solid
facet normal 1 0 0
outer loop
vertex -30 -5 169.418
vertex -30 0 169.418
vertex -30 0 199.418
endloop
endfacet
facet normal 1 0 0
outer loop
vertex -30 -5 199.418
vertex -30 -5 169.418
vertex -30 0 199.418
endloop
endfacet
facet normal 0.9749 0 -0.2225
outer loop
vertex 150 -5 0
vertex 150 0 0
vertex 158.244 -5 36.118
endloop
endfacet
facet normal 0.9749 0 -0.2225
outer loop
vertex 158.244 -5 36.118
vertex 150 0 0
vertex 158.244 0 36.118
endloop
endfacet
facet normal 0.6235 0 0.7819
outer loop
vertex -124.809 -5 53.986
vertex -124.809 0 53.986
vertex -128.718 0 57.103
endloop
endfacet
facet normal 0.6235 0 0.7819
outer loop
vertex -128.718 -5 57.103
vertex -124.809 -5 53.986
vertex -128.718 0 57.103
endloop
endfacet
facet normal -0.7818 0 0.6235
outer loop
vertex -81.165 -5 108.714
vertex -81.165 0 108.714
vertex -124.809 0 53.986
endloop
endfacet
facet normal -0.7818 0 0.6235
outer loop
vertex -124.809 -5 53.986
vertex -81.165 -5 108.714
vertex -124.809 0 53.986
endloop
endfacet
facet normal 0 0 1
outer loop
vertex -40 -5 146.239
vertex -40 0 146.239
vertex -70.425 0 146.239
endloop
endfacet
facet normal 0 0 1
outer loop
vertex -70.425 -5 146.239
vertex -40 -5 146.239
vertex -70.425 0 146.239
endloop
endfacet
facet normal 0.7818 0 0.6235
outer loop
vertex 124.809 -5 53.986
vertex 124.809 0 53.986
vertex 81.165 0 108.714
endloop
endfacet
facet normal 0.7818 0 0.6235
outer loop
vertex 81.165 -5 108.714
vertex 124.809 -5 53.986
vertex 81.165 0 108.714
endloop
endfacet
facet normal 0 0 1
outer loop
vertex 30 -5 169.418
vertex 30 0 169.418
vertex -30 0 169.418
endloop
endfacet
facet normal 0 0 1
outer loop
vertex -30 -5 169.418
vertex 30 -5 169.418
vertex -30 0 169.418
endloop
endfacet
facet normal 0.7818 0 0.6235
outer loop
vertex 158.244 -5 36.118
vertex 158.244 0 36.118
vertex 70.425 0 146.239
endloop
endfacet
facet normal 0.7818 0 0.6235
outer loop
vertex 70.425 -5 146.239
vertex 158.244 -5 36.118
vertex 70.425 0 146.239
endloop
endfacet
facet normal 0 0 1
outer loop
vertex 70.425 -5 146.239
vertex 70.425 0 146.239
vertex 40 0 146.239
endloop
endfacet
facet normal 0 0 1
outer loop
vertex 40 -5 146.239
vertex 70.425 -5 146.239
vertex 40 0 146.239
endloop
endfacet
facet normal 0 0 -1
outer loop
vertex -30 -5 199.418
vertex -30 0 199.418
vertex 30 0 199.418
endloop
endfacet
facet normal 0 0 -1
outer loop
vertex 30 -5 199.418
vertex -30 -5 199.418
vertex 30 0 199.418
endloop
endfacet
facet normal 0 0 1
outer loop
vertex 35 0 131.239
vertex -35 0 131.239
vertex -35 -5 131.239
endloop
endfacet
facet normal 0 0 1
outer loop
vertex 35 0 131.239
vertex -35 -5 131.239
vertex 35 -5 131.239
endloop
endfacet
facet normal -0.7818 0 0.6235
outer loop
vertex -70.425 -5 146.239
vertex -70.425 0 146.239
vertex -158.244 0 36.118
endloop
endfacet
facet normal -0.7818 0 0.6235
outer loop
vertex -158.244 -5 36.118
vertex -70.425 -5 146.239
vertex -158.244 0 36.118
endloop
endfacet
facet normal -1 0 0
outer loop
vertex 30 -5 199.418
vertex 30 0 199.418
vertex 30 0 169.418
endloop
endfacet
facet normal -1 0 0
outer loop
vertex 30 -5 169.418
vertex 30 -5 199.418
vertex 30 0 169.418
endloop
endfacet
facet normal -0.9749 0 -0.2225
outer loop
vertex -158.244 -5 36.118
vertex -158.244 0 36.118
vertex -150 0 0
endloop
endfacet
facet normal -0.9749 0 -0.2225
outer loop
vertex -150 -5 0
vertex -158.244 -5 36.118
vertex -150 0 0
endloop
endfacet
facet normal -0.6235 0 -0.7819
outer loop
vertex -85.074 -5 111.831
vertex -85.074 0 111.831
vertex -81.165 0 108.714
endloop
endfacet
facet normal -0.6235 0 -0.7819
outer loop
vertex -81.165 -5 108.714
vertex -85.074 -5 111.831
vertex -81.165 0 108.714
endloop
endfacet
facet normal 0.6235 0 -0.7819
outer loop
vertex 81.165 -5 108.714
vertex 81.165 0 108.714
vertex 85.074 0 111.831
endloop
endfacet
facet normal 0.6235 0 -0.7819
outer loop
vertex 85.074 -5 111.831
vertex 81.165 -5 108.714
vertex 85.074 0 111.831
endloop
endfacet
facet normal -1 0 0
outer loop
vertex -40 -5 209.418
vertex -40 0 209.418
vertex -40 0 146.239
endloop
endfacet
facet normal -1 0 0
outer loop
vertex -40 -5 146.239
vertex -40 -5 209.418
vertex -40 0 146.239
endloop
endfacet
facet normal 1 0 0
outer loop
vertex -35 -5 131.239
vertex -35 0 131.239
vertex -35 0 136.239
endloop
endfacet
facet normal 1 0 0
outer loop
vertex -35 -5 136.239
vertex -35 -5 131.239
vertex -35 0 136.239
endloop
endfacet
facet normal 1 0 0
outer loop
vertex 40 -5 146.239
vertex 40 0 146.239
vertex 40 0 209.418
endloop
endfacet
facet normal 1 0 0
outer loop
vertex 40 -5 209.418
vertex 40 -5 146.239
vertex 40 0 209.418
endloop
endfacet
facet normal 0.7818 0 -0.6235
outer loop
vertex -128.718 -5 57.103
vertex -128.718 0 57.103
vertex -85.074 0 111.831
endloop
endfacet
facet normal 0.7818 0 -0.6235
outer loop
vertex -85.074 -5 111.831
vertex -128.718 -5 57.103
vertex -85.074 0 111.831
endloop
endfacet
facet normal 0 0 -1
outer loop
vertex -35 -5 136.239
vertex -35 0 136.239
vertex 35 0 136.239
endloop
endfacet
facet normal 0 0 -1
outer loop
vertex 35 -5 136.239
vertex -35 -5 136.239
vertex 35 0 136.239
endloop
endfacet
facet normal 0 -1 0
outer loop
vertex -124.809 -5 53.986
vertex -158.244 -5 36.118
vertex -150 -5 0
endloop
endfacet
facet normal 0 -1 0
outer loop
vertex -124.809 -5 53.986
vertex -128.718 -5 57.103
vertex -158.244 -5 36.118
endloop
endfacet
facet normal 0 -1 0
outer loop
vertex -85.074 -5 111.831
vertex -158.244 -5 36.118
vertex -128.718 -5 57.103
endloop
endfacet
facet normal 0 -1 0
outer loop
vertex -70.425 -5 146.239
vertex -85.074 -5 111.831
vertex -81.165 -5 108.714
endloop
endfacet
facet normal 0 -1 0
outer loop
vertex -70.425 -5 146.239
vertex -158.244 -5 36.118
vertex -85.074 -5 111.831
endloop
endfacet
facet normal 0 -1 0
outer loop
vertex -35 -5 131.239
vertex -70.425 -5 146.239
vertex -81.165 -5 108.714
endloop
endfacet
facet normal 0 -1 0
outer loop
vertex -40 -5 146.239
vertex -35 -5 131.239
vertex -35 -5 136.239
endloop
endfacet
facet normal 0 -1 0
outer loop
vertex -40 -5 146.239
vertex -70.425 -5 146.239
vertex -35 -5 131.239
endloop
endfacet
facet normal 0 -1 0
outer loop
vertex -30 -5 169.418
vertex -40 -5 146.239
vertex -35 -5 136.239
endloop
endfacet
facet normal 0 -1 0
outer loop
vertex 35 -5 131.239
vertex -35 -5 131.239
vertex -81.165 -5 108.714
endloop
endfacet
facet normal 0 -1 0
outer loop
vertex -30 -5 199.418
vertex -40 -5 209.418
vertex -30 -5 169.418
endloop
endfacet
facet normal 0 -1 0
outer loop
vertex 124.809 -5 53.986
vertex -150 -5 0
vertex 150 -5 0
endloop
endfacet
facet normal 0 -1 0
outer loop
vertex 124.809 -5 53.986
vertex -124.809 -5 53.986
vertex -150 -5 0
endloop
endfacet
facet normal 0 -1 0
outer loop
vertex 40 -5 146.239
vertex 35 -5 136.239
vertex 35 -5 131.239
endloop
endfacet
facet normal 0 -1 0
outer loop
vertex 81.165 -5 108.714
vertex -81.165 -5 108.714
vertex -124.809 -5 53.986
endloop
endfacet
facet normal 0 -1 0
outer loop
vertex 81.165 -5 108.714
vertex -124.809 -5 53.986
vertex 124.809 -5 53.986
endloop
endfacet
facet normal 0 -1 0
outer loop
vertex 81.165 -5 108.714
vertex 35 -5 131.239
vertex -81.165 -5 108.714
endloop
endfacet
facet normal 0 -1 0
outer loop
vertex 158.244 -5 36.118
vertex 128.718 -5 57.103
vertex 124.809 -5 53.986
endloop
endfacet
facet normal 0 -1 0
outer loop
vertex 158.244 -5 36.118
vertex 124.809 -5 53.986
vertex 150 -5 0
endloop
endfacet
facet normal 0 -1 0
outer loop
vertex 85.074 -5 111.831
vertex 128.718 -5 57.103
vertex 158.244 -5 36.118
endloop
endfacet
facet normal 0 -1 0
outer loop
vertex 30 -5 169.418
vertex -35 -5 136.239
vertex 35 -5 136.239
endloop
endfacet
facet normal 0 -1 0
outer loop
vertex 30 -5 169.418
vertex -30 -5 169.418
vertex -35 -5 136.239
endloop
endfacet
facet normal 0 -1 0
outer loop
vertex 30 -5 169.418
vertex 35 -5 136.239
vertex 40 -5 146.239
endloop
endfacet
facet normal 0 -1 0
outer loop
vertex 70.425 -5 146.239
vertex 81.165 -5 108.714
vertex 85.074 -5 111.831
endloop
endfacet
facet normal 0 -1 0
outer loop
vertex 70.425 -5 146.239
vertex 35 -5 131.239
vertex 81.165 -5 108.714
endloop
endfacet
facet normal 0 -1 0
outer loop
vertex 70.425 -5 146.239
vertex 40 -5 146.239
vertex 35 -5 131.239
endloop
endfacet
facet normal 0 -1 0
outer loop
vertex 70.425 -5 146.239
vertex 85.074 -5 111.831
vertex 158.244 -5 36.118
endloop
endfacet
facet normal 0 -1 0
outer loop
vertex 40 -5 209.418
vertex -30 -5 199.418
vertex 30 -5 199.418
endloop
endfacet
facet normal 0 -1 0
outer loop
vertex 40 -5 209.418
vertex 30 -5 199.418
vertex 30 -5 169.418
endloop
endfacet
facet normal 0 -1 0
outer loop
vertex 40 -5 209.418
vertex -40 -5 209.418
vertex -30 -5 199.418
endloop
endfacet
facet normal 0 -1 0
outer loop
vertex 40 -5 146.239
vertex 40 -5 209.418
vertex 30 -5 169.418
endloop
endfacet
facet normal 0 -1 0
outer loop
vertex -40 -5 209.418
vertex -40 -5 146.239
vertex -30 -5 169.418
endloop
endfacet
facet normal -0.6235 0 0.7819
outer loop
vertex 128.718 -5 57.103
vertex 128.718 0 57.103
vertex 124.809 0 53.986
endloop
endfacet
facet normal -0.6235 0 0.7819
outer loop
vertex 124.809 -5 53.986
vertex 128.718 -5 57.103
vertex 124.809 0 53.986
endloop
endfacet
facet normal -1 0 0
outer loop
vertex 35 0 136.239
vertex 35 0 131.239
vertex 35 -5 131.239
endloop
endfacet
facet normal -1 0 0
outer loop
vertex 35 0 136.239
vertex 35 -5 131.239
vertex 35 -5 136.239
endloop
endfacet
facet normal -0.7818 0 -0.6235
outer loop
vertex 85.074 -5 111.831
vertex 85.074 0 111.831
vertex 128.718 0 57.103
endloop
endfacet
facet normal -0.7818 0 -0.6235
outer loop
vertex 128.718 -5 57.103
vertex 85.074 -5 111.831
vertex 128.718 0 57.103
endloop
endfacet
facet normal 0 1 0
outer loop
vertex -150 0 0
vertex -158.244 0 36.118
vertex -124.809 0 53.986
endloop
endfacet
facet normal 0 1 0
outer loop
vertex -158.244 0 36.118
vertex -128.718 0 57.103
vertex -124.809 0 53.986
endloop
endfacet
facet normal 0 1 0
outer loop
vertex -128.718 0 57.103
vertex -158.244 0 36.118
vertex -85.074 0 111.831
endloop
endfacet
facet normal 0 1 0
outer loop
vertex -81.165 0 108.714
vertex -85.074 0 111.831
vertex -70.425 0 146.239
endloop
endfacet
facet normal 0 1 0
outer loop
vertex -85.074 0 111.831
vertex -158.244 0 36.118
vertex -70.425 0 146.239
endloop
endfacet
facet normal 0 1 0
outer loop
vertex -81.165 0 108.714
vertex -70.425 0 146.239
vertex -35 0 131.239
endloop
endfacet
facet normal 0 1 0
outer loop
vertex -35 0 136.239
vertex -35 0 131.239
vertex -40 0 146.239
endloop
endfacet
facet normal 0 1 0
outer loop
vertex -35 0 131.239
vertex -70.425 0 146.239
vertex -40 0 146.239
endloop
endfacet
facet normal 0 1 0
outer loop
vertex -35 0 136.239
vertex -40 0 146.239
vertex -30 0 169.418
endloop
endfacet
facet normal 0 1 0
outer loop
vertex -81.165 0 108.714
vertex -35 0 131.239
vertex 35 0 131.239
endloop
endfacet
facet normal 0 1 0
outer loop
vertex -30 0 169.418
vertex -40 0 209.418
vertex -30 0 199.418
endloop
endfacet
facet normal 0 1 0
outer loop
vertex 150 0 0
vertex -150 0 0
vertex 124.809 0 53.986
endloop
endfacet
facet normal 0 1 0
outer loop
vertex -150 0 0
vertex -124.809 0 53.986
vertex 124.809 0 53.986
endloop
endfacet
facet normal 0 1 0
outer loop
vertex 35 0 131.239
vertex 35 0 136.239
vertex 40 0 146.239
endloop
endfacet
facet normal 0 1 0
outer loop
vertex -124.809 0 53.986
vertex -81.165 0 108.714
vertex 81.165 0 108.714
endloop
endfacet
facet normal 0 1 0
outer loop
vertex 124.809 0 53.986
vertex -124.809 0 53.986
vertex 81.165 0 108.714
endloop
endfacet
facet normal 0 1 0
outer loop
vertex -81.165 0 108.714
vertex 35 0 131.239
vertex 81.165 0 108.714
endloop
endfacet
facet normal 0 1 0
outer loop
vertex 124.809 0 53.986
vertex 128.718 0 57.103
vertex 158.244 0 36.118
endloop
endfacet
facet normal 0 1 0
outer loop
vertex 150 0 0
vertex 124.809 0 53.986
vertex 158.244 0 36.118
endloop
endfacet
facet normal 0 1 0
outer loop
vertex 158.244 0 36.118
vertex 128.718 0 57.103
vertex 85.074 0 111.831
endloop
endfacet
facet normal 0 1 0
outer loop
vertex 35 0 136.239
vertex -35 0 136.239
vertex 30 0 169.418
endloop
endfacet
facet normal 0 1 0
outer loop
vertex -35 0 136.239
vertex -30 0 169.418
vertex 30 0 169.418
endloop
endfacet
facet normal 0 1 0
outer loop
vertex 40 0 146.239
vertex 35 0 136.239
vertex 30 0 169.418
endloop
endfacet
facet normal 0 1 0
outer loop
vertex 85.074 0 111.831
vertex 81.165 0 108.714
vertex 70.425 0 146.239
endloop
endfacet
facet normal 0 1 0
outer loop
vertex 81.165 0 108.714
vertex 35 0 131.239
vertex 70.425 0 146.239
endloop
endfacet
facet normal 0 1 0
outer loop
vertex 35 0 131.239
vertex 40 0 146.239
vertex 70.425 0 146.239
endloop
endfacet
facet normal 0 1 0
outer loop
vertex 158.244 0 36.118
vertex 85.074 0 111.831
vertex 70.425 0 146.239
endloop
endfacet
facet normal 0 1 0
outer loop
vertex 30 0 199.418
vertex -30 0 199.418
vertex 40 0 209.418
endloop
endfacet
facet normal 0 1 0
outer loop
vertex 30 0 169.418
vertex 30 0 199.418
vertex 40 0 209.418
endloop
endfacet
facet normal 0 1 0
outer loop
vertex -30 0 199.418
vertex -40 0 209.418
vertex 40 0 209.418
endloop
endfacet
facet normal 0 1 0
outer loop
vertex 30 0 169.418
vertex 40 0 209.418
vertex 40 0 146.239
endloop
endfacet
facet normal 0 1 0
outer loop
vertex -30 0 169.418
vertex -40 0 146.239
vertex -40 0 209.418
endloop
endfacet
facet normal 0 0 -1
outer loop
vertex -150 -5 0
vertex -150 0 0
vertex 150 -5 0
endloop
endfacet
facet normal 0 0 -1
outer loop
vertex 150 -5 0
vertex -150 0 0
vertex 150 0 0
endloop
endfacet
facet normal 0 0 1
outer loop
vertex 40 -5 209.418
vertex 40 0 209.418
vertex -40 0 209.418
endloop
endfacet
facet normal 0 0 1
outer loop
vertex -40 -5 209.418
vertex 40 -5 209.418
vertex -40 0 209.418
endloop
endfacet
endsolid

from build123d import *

# Parameters (mm, degrees)
F0_W     = 70
F0_H     = 5
F1_DEPTH = 5


with BuildPart() as f1:
    # F0 (on Front) → F1 (new body)
    with BuildSketch(Plane.XZ):
        Polygon((-40, 146.239187), (-70.425081, 146.239187), (-158.24372, 36.118096), (-150, 0), (150, 0), (158.24372, 36.118096), (70.425081, 146.239187), (40, 146.239187), (40, 209.417821), (1.491508, 209.417821), (-40, 209.417821), align=None)
        Polygon((-81.164699, 108.714), (-124.808985, 53.985796), (-128.718142, 57.103245), (-85.073856, 111.831449), align=None, mode=Mode.SUBTRACT)
        Polygon((128.718142, 57.103245), (124.808985, 53.985796), (81.164699, 108.714), (85.073856, 111.831449), align=None, mode=Mode.SUBTRACT)
        with Locations((0, 133.739187)):
            Rectangle(F0_W, F0_H, mode=Mode.SUBTRACT)
        Polygon((-30, 199.417821), (0, 199.417821), (30, 199.417821), (30, 169.417821), (-30, 169.417821), align=None, mode=Mode.SUBTRACT)
    extrude(amount=F1_DEPTH)


solid = f1.part
